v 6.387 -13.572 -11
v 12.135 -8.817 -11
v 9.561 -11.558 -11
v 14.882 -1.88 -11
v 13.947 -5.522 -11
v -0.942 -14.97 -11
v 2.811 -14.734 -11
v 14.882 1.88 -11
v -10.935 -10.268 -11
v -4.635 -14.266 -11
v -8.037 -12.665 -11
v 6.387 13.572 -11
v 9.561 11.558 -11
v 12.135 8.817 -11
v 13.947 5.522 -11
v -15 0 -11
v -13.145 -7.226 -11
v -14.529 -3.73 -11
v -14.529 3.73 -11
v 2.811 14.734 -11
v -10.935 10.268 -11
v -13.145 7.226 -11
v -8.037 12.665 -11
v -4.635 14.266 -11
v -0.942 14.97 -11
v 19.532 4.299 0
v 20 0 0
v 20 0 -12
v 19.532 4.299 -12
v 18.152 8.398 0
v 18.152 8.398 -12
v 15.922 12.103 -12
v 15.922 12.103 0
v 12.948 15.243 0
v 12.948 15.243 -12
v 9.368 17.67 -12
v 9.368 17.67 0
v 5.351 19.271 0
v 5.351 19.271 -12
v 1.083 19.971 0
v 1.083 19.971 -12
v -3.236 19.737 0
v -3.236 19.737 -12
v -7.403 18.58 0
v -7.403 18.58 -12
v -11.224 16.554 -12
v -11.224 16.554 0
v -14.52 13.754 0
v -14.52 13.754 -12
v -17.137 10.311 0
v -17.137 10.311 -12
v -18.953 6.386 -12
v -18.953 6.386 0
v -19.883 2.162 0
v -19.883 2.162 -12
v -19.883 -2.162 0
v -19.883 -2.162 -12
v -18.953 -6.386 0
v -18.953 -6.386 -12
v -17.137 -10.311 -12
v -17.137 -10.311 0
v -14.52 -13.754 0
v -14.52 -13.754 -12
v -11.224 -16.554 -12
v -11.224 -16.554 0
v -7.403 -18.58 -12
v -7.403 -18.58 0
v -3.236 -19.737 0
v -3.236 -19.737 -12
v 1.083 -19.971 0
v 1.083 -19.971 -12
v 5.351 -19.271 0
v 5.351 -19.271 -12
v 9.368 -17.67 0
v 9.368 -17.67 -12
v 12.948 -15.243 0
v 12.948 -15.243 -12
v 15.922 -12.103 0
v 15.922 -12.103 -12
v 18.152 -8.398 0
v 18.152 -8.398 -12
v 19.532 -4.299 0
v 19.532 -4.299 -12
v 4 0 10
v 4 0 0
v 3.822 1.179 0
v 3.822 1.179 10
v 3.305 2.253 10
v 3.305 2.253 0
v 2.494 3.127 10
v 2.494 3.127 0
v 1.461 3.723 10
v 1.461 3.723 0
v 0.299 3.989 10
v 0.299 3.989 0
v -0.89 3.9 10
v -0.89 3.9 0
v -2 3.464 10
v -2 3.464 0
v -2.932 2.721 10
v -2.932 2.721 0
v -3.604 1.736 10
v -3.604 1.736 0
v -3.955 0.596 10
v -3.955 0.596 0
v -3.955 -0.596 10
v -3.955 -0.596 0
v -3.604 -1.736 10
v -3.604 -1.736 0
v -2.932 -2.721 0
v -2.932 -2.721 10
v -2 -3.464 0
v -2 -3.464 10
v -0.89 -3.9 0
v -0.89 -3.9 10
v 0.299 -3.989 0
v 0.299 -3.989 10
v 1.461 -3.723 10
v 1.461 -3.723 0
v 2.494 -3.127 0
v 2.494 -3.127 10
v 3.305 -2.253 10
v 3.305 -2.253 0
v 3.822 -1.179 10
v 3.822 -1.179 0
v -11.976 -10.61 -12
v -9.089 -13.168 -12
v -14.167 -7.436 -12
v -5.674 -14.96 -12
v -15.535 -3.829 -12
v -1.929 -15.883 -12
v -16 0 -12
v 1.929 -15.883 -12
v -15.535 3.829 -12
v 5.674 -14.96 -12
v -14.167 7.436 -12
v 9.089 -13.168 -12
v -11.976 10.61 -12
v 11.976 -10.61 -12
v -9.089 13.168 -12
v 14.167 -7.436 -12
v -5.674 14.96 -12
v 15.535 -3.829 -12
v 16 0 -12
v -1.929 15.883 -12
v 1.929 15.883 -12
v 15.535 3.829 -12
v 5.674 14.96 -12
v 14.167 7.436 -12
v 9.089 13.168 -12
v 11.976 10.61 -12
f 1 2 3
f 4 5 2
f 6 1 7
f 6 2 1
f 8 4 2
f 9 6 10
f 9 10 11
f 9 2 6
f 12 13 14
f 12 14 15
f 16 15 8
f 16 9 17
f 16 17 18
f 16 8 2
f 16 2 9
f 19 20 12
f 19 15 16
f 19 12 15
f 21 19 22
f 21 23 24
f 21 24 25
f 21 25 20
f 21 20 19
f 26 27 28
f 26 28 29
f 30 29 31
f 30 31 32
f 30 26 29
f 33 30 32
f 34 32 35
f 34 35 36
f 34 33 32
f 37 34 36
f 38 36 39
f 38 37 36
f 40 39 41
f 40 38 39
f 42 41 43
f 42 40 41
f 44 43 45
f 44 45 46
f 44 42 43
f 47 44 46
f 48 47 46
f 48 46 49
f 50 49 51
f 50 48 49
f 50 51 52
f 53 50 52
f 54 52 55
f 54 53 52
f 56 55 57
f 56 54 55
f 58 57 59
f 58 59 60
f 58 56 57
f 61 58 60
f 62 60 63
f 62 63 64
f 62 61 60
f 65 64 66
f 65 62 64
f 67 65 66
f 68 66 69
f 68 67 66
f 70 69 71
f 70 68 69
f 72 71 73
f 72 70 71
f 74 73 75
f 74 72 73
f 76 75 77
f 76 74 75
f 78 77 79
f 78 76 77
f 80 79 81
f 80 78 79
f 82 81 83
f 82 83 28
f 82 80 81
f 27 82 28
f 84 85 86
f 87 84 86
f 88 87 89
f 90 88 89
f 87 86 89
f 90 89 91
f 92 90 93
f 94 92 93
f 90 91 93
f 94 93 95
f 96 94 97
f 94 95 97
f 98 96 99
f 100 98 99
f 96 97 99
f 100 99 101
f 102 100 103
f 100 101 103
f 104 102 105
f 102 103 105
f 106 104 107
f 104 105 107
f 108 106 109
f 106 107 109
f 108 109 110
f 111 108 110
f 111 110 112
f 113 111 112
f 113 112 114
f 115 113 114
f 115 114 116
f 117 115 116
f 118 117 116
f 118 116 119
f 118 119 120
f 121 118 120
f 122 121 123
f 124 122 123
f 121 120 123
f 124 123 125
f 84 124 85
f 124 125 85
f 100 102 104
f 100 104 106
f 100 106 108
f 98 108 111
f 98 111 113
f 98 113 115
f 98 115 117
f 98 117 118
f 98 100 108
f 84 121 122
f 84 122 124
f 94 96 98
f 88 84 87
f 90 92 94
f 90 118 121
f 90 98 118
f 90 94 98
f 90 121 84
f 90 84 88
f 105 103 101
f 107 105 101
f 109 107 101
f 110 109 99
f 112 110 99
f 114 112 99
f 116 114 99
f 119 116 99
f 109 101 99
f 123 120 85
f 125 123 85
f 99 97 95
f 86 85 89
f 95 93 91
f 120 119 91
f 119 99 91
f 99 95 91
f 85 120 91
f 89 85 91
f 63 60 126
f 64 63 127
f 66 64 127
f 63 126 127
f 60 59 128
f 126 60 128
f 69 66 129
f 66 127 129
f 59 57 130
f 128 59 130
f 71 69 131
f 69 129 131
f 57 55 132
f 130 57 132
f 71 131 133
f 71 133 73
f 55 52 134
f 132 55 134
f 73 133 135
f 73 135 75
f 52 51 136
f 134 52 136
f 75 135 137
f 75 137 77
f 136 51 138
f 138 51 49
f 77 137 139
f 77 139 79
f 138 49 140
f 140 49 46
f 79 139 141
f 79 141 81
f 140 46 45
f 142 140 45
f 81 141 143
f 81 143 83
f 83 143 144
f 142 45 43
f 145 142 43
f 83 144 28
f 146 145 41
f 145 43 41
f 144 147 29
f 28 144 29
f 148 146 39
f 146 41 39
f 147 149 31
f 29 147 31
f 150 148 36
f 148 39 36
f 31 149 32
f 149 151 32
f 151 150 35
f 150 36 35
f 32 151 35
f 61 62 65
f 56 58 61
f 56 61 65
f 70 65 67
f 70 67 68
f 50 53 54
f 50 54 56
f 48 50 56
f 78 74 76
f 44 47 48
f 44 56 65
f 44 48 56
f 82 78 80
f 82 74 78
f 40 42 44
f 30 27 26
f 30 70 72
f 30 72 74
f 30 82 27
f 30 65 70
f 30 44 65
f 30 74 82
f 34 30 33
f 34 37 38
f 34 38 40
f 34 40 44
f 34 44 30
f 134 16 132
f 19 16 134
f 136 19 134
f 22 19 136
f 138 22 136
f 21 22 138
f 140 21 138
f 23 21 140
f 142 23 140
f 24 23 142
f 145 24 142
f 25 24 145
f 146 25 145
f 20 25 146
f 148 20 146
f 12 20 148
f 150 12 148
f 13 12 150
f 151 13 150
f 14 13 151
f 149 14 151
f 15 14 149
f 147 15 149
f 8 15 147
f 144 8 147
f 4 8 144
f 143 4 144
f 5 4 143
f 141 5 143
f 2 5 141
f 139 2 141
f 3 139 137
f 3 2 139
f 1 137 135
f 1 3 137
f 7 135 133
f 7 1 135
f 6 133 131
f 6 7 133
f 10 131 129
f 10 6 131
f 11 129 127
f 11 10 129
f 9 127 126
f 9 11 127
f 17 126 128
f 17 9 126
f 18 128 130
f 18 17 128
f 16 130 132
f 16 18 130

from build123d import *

# Parameters (mm, degrees)
SKETCH1_R          = 20
FOOT_BODY_DEPTH    = 12
SKETCH2_R          = 4
M8_STUD_DEPTH      = 10
SKETCH3_R          = 15
CUT_EXTRUDE1_DEPTH = 1
CHAMFER1_SIZE      = 1


with BuildPart() as part:
    # Sketch1 → FOOT_BODY (new body)
    with BuildSketch(Plane.XY):
        Circle(SKETCH1_R)
    extrude(amount=-FOOT_BODY_DEPTH)

    # Sketch3 → Cut-Extrude1 (cut)
    with BuildSketch(Plane(origin=(0, 0, -12), x_dir=(-1, 0, 0), z_dir=(0, 0, -1))):
        Circle(SKETCH3_R)
    extrude(amount=-CUT_EXTRUDE1_DEPTH, mode=Mode.SUBTRACT)

    # Chamfer1
    chamfer1_edges = [part.edges().sort_by_distance(p)[0] for p in [
        (15, 0, -12),
    ]]
    chamfer(chamfer1_edges, length=CHAMFER1_SIZE - 0.0001)  # a hair under: the kernel refuses the full size


with BuildPart() as body_2:
    # Sketch2 → M8_STUD (new body)
    with BuildSketch(Plane.XY):
        Circle(SKETCH2_R)
    extrude(amount=M8_STUD_DEPTH)


solid = Compound([part.part, body_2.part])
